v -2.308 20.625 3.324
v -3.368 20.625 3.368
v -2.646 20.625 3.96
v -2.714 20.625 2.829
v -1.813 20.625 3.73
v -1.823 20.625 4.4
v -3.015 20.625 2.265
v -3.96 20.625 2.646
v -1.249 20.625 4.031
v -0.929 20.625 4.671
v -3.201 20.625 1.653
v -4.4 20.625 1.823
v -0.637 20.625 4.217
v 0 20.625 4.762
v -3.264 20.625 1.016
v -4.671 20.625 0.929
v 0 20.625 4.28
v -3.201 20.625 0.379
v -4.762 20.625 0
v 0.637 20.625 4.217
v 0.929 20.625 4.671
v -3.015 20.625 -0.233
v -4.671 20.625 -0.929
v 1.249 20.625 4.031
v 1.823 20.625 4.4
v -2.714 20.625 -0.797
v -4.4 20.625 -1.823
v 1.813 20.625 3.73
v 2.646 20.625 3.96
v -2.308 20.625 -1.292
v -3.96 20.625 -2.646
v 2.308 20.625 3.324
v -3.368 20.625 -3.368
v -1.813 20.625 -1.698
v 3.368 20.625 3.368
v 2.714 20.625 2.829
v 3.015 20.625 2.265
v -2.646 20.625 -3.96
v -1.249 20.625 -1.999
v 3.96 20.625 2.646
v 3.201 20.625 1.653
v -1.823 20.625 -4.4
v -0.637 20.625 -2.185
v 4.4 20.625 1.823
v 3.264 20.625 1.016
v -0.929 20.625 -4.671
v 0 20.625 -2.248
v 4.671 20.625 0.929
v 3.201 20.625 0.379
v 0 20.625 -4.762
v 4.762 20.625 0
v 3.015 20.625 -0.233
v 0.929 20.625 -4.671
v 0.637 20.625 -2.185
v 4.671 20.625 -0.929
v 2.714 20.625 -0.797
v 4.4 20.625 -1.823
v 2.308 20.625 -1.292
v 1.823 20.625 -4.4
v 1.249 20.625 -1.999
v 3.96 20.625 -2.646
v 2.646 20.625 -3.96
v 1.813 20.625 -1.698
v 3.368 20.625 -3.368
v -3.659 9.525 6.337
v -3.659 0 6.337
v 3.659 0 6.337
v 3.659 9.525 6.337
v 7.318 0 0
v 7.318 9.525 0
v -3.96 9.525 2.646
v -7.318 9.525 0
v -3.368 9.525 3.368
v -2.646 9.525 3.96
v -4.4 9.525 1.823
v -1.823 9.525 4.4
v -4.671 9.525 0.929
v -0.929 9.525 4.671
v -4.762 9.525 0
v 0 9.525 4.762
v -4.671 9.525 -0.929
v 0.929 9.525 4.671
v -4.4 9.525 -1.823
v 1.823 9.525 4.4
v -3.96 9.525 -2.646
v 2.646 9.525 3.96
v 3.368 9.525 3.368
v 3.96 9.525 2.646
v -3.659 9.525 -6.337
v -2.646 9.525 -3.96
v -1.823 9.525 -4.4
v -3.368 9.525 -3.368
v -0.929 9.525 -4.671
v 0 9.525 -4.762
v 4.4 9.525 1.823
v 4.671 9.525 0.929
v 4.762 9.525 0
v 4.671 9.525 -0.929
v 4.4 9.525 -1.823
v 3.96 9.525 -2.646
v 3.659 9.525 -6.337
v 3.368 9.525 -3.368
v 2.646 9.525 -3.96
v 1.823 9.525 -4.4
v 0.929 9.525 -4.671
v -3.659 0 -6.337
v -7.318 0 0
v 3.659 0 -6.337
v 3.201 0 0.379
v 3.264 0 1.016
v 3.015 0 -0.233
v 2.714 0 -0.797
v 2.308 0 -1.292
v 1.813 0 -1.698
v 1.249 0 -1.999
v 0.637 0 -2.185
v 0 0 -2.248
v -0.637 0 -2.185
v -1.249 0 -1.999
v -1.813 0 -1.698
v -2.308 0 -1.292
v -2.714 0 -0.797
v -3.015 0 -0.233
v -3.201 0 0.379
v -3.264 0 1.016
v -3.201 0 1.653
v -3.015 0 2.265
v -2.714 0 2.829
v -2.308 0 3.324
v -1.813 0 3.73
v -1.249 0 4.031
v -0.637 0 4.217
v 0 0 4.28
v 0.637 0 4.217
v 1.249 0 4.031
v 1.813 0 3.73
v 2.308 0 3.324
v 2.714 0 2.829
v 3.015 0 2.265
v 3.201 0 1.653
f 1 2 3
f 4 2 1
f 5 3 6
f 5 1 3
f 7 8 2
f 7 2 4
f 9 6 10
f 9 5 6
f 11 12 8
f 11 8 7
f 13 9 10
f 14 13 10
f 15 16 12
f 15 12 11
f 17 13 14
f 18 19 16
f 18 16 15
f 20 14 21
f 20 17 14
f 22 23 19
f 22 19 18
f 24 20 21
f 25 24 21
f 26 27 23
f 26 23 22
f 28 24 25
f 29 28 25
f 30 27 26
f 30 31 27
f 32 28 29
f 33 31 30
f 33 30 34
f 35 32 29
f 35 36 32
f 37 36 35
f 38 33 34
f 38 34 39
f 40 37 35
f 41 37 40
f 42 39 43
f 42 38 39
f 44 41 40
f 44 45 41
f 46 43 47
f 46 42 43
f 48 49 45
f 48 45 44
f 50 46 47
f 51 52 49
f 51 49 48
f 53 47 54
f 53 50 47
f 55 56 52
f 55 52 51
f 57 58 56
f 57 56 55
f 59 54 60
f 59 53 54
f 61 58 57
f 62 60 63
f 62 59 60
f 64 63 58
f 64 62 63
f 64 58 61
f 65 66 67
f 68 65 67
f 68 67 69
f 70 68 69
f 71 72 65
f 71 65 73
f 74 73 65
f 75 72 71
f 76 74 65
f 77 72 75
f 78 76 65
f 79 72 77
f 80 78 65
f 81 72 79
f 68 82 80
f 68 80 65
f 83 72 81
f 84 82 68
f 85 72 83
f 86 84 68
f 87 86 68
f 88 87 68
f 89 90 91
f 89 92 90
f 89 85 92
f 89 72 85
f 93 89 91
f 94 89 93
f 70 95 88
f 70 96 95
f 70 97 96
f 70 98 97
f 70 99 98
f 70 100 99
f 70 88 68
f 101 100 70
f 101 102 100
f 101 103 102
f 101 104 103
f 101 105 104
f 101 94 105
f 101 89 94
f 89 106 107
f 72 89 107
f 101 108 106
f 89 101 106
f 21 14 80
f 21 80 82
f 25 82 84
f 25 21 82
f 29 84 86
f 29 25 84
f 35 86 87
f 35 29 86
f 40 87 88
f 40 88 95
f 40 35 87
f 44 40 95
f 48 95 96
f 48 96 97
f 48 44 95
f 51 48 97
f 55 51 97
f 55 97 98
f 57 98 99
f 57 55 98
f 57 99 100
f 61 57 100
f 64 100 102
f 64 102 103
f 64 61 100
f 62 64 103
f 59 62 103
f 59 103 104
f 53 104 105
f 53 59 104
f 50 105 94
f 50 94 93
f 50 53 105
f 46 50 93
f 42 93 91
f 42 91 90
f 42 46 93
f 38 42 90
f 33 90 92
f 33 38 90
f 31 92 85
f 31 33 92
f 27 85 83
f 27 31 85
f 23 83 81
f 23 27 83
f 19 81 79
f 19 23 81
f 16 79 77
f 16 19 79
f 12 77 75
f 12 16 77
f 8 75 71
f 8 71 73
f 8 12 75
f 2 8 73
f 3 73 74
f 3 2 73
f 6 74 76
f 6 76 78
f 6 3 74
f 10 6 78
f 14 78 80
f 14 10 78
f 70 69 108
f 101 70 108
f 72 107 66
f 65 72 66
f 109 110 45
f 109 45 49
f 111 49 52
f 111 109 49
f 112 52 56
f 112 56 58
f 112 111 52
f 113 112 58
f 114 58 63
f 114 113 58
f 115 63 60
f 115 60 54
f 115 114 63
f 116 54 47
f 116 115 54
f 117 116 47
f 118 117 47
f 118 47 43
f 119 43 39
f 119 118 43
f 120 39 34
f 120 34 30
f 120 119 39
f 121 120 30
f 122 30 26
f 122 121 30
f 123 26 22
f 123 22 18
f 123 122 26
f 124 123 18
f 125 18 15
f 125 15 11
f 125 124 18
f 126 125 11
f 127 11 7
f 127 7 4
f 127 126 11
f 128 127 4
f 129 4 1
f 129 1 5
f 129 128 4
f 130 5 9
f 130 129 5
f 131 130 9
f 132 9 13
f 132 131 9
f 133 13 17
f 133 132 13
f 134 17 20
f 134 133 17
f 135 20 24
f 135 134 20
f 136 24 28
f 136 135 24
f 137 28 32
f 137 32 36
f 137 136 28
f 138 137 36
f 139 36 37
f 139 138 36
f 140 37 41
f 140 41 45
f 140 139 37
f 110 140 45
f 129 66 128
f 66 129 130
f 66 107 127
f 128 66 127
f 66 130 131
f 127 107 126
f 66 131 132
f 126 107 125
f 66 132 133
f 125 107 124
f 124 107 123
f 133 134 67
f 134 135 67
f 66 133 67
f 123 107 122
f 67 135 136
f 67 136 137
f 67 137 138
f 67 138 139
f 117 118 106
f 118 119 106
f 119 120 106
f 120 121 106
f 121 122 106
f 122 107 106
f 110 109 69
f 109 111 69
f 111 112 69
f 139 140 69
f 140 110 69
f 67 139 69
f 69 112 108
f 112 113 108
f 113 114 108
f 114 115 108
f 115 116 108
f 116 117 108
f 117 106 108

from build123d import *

# Parameters (mm, degrees)
BOSS_EXTRUDE1_OUTLINE_R = 3.2639
BOSS_EXTRUDE1_DEPTH     = 20.6248
SKETCH2_OUTSIDE_W       = 22.294
SKETCH2_OUTSIDE_H       = 20.332
SKETCH2_OUTSIDE_R       = 4.7625
CUT_EXTRUDE2_DEPTH      = 11.0998


# Read off the part's stored shape, not the designer's step: Boss-Extrude1
with BuildPart() as part:
    # Boss-Extrude1 outline → Boss-Extrude1 (new body)
    with BuildSketch(Plane(origin=(0, 0, 0), x_dir=(1, 0, 0), z_dir=(0, 1, 0))):
        Polygon((3.658841861, -6.3373), (7.317683722, 0), (3.658841861, 6.3373), (-3.658841861, 6.3373), (-7.317683722, 0), (-3.658841861, -6.3373), align=None)
        with Locations((0, -1.016)):
            Circle(BOSS_EXTRUDE1_OUTLINE_R, mode=Mode.SUBTRACT)
    extrude(amount=BOSS_EXTRUDE1_DEPTH)

    # Sketch2 outside → Cut-Extrude2 (cut)
    with BuildSketch(Plane(origin=(0, 20.6248, 0), x_dir=(1, 0, 0), z_dir=(0, 1, 0))):
        Rectangle(SKETCH2_OUTSIDE_W, SKETCH2_OUTSIDE_H)
        with Locations(Location((0, 0, 0), (0, 0, 270))):
            Circle(SKETCH2_OUTSIDE_R, mode=Mode.SUBTRACT)
    extrude(amount=-CUT_EXTRUDE2_DEPTH, mode=Mode.SUBTRACT)


solid = part.part
